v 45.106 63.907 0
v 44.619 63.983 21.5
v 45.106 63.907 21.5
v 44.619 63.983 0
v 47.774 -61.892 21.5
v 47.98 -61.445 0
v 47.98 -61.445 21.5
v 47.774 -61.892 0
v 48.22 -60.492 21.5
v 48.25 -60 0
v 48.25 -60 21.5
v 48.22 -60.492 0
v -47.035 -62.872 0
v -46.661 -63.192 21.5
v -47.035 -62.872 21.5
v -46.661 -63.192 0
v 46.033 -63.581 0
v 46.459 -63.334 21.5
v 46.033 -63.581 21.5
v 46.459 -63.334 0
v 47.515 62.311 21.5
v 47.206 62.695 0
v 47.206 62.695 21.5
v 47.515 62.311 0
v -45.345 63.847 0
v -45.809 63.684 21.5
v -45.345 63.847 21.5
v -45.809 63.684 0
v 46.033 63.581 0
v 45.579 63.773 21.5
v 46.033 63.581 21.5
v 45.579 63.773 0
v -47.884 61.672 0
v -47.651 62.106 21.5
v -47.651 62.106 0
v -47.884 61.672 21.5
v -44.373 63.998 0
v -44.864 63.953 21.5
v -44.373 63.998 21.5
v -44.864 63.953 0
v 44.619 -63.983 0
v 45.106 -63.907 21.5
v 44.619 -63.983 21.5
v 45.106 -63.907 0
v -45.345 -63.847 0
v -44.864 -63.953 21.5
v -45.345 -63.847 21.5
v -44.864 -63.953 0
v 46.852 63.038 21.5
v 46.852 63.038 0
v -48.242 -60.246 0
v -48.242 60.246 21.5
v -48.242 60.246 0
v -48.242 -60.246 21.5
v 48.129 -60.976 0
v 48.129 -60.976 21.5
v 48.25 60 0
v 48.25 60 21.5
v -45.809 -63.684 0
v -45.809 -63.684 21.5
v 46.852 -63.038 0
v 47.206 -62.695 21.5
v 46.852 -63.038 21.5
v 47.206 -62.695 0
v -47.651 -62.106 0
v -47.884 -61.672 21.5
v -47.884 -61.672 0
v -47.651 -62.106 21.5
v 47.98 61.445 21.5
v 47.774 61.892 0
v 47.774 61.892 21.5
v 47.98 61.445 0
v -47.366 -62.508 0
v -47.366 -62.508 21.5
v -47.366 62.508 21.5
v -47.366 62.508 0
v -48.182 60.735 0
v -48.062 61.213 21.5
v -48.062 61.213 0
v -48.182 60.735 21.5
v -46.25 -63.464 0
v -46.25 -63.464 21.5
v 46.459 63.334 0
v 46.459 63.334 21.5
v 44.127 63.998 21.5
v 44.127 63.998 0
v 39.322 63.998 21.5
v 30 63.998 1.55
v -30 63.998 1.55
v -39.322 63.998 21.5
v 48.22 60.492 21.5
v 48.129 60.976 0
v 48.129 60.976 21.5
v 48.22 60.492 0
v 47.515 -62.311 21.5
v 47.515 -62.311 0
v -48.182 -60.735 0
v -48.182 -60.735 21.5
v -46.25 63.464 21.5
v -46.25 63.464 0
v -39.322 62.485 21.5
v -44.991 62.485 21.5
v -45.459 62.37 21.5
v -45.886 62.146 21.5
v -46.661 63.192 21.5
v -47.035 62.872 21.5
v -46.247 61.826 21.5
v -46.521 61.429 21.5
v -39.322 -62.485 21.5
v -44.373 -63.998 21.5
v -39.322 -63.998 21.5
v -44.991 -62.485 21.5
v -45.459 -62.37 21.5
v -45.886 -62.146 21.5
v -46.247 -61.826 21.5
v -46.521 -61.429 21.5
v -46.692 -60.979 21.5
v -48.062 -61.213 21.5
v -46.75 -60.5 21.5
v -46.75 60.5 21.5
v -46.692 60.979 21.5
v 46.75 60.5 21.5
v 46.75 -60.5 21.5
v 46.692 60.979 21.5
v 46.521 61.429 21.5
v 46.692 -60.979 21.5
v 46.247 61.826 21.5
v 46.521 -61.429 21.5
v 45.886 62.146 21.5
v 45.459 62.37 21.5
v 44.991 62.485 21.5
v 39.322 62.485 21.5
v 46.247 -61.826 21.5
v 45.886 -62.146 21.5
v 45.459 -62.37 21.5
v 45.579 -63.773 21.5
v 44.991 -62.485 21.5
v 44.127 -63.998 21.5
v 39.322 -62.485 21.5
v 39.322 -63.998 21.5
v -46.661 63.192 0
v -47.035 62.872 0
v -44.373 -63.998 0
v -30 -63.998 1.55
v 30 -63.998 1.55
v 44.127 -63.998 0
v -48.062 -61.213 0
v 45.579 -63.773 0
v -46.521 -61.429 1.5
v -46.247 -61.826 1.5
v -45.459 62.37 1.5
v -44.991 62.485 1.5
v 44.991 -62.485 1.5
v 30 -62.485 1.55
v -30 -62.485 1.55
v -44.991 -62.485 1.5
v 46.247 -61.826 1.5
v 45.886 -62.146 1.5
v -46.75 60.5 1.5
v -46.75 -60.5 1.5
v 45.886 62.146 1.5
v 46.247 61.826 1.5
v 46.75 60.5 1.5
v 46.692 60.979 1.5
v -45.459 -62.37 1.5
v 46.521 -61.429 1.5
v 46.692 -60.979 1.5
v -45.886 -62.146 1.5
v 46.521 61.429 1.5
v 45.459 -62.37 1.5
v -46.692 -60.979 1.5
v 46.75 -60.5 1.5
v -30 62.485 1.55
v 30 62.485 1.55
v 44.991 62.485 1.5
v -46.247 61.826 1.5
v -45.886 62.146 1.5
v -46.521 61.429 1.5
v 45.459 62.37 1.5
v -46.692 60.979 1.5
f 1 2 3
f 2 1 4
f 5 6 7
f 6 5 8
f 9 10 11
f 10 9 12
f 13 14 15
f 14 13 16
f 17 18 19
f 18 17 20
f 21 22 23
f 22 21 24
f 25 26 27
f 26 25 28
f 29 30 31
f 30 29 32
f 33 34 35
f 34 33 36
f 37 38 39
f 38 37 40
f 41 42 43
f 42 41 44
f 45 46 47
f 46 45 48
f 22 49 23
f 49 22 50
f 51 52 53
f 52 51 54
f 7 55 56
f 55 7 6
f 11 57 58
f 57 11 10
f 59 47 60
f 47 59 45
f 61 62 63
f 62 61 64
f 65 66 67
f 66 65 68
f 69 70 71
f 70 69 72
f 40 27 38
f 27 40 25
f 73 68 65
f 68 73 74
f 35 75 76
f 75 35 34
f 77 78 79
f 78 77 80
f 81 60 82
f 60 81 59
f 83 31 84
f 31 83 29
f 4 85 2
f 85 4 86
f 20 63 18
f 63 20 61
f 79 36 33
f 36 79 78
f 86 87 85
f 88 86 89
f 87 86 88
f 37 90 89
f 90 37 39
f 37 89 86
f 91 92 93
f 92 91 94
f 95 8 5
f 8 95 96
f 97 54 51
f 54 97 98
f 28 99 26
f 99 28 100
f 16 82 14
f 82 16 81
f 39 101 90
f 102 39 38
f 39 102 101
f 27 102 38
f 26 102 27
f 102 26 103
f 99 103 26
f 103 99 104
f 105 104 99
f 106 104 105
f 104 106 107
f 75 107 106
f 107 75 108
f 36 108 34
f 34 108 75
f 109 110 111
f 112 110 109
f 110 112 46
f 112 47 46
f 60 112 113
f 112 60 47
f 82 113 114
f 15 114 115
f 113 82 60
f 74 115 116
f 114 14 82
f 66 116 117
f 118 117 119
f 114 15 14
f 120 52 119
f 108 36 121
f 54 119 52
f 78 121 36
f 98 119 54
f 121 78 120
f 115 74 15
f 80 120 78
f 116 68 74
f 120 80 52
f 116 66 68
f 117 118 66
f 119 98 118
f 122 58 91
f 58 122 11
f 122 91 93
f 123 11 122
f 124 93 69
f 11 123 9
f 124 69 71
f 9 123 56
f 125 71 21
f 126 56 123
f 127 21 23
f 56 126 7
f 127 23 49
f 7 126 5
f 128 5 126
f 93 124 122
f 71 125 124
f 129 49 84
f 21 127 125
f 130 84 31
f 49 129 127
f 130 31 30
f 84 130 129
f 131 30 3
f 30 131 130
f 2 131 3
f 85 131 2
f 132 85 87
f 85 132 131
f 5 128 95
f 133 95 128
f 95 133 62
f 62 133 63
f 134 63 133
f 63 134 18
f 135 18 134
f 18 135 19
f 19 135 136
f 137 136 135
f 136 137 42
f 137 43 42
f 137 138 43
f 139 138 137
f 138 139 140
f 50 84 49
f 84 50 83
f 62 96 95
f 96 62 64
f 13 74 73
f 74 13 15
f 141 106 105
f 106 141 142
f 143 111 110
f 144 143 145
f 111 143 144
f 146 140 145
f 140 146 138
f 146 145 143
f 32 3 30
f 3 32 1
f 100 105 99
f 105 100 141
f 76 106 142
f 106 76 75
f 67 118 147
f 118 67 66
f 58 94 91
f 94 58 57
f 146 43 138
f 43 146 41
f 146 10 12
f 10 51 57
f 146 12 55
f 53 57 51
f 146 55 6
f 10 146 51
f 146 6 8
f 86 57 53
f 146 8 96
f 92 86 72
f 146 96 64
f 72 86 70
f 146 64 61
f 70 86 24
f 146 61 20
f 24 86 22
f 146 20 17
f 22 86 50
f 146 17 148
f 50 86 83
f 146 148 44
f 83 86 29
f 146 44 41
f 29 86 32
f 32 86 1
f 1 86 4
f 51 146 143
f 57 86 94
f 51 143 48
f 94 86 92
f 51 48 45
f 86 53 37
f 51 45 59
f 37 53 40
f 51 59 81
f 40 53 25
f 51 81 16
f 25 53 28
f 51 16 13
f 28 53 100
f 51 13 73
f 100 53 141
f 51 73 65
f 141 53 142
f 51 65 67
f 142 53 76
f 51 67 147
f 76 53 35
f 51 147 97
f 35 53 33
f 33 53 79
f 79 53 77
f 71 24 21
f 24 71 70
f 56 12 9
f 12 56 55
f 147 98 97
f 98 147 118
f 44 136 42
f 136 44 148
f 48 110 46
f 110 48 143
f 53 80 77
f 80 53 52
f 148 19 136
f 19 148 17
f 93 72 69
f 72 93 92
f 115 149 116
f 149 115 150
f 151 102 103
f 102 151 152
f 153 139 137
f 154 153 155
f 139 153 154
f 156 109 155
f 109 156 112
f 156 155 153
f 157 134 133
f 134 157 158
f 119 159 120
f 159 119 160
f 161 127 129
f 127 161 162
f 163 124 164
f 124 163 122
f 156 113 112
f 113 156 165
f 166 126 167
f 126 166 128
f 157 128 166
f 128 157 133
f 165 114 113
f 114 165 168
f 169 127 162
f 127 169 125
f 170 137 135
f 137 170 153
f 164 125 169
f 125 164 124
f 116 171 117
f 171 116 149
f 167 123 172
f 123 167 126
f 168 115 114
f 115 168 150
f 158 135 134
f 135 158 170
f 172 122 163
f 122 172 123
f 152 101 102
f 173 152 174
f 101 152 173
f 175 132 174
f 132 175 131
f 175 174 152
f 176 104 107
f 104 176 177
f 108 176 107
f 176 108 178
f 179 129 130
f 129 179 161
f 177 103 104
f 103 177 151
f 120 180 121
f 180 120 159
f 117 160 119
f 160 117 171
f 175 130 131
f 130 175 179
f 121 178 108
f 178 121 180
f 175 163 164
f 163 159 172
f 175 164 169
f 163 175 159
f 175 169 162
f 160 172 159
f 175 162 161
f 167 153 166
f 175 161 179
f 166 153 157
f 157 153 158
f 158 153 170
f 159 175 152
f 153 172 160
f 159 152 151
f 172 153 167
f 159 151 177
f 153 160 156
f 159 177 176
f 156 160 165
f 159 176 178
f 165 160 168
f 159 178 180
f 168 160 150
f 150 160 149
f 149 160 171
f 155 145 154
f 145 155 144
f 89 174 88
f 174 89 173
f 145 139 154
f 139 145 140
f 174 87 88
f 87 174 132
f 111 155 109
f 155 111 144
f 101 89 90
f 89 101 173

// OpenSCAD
// file: config.scad
//$fs=$fs/2;
//$fa=$fa/2;

r4 = 2.2;
r8 = 4.2;
r10 = 5.2;

layer_height = 0.25;

switch_d = 9.6;

nema17_r_vis = 15.5;
nema17_r_centre = 11.5;
nema17_h_centre = 2;
nema17_h = 43;
nema17_l = 40;

boite_ui_largeur = 28.5;
boite_ui_l = 46;

support_laser = 24;

r3 = 1.75;
r3_2d = 1.5;
r3_vis = 1.65;
r3_head = 3.6;
m3_r = r3;
m3_nut_d = 7;
m3_nut_d2 = 6.2;
m3_nut_h = 3;

m4_r = 2.3;
m4_nut_d = 8.4;
m4_nut_d2 = 7.5;
m4_nut_h = 3.5;

608_r = 23/2;
608_h = 8;

laser_printer_l = 609;
laser_printer_lg = 456;


module support_nut(d=3, l_screw1 = 20, l_screw2 = 20, l_nut = 20, h_screw2 = 0.2){
    if(d==3){
        screw_r = r3;
        nut_r = m3_nut_d/2;
        nut_h = m3_nut_h;
        cylinder(nut_h, r = nut_r, $fn = 6, center = true);
        translate([0, 0, -l_screw1])cylinder(l_screw1 +1, r = screw_r, $fn = 8);
        translate([0, 0, m3_nut_h/2+ h_screw2])cylinder(l_screw2, r = screw_r, $fn = 8);
        l = m3_nut_d*cos(30);
        translate([0, -l/2, -nut_h/2]) cube([l_nut, l,nut_h]);
    } else if(d==4){
        screw_r = r4;
        nut_r = m4_nut_d/2;
        nut_h = m4_nut_h;
        cylinder(nut_h, r = nut_r, $fn = 6, center = true);
        translate([0, 0, -l_screw1])cylinder(l_screw1 +1, r = screw_r, $fn = 8);
        translate([0, 0, m4_nut_h/2+ h_screw2])cylinder(l_screw2, r = screw_r, $fn = 8);
        l = m4_nut_d*cos(30);
        translate([0, -l/2, -nut_h/2]) cube([l_nut, l,nut_h]);
    }
}


module nut(d=3, center = false){
    nut_r = m3_nut_d/2;
    nut_h = m3_nut_h;
    if(d==3){
        nut_r = m3_nut_d/2;
        nut_h = m3_nut_h;
    } 
    cylinder(nut_h, r = nut_r, $fn = 6, center = center);
}



module m3(h, nut = false, head = false){
    cylinder(h, m3_r, m3_r, $fn=16);
    if(nut){
        cylinder(m3_nut_h, r = m3_nut_d/2, $fn = 6);
    }
}

module m3_nut(h){
    cylinder(m3_nut_h, r = m3_nut_d/2, $fn = 6);
    translate([0, -m3_nut_d2/2, 0]) cube([h, m3_nut_d2, m3_nut_h]);
}

module m4(h, nut = false, head = false){
    cylinder(h, m4_r, m4_r);
    if(nut){
        cylinder(m4_nut_h, r = m4_nut_d/2, $fn = 6);
    }
}

module m5(h, nut = false, head = false){
    cylinder(h, r = 2.7);
}

m8_nut_d = 15;
m8_nut_d2 = 13;
m8_nut_h = 6.5;
module m8(h, nut = false, head = false){
    cylinder(h, r = r8);
    if(nut){
        cylinder(m8_nut_h, r = m8_nut_d/2, $fn = 6);
    }
}

module cube_arrondi(x, y, z, r=2){
    hull(){
        translate([(x/2-r), (y/2-r), 0]) cylinder(z,r=r);
        translate([(x/2-r), -(y/2-r), 0]) cylinder(z,r=r);
        translate([-(x/2-r), (y/2-r), 0]) cylinder(z,r=r);
        translate([-(x/2-r), -(y/2-r), 0]) cylinder(z,r=r);
    }
}

module demi_glissiere(r, l, h){
    cylinder(h, r, r);
    translate([-r, 0, 0]) cube([r*2, l, h]);
}


module nema17_2d(){
    nema17_l = 43;
    nema17_h = 6;
    polygon([[0,nema17_h], [nema17_h,0]
            , [nema17_l-nema17_h,0],[nema17_l,nema17_h]
            , [nema17_l,nema17_l-nema17_h],[nema17_l-nema17_h,nema17_l]
            , [8,nema17_l],[0,nema17_l-nema17_h] ]);
}

module nema17_2d2(){
    translate([nema17_r_vis, nema17_r_vis] ) circle(r3_2d);
    translate([nema17_r_vis, -nema17_r_vis] ) circle(r3_2d);
    translate([-nema17_r_vis, nema17_r_vis] ) circle(r3_2d);
    translate([-nema17_r_vis, -nema17_r_vis] ) circle(r3_2d);
    circle(nema17_r_centre);
}


module nema17(){
    translate([-nema17_h/2, -nema17_h/2, -nema17_l/2] ) linear_extrude(nema17_l) nema17_2d();
    
    h = nema17_h/2+6;
    translate([nema17_r_vis, nema17_r_vis, 0] )rotate([0, 0, 0]) cylinder(h, r = r3);
    translate([nema17_r_vis, -nema17_r_vis, 0] )rotate([0, 0, 0]) cylinder(h, r = r3);
    translate([-nema17_r_vis, nema17_r_vis, 0] )rotate([0, 0, 0]) cylinder(h, r = r3);
    translate([-nema17_r_vis, -nema17_r_vis, 0] )rotate([0, 0, 0]) cylinder(h, r = r3);
    cylinder(h, nema17_r_centre, nema17_r_centre);
    cylinder(h+14, r = 8);
    
    translate([-8.5, 0, -nema17_l/2] ) cube([17,30, 10]);
}

module corner(l_corner, h_corner, lg_corner){
    translate([0, lg_corner, 0]) rotate([90, 0, 0]) linear_extrude(lg_corner) polygon([[0,0], [l_corner, 0], [0, h_corner]]);
}


/**
 * 2D
 **/

module m3_2d(){
    circle(r3_2d);
}


module cran_x(_l, e, cran, inv){
    difference(){
        square([_l, e]);
        if(inv){
            for(i=[-round(_l/cran):round(_l/cran)]){
                translate([_l/2 + cran/2 - 2*i*cran, -1]) square([cran, e+2]);
            }
        }else{
            for(i=[-round(_l/cran):round(_l/cran)]){
                translate([_l/2 - cran/2 - 2*i*cran, -1]) square([cran, e+2]);
            }
        }
    }
}

module cran_y(_l, e, cran, inv){
    translate([e, 0]) rotate([0, 0, 90]) cran_x(_l, e, cran, inv); 
}

module whole_2d(type_vis){
    if(type_vis == 3){
        circle(1.5);
    } else if(type_vis == 4){
        circle(2);
    } else {
        echo("whole_2d " + type_vis);
    }
}

module nuts_2d(type_vis){
    if(type_vis == 3){
        translate([-1.5, 0])square([3, 20]);
        translate([-5.5/2, 10])square([5.5, 2.5]);
    } else if(type_vis == 4){
        translate([-2, 0])square([4, 30]);
        translate([-7/2, 20])square([7, 3.5]);
    } else {
        echo("nuts_2d " + type_vis);
    }
}

module cran_x_vis(_l, e, cran, type_vis = 3, trous = [0.1, 0.5, 0.9]){
    difference(){
        square([_l, e]);
        for(i=[-round(_l/cran):round(_l/cran)]){
                translate([_l/2 - cran/2 - 2*i*cran, -1]) square([cran, e+2]);
            }
        
    }
    for(i = trous){
        j = round((i-0.5)*_l/(2*cran));
        translate([_l/2  - 2*j*cran, e/2]) whole_2d(type_vis);
    }
}

module cran_x_nuts(_l, e, cran, type_vis = 3, trous = [0.1, 0.5, 0.9]){
    difference(){
        square([_l, e]);
        for(i=[-round(_l/cran):round(_l/cran)]){
                translate([_l/2 + cran/2 - 2*i*cran, -1]) square([cran, e+2]);
        }
    }
    for(i = trous){
        j = round((i-0.5)*_l/(2*cran));
        translate([_l/2  - 2*j*cran, e/2]) nuts_2d(type_vis);
    }
}

module cran_y_vis(_l, e, cran, type_vis = 3, trous = [0.1, 0.5, 0.9]){
    translate([e, 0]) rotate([0, 0, 90]) cran_x_vis(_l, e, cran, type_vis, trous);
}

module cran_y_nuts(_l, e, cran, type_vis = 3, trous = [0.1, 0.5, 0.9]){
    translate([0, _l]) rotate([0, 0, -90]) cran_x_nuts(_l, e, cran, type_vis, trous);
}
// main file
$fs=$fs/4;
$fa=$fa/4;
include <config.scad> 

card_l = 90;
card_lg = 60;
h=20;
e= 1.5;
e_h=1.5;

module support_2_card(){
    l = card_l+2*e;
    lg = 2*card_lg+3*e;
    difference(){
        cube_arrondi(l, lg, h+e_h, 4);
        
        for(i=[-1,1]){
            translate([0,i*(card_lg+e)/2,0]) union(){
                translate([0,0,e_h])cube_arrondi(card_l, card_lg,h+1);
                hull(){
                    translate([0,0,e_h+0.1])cube([card_l+h+e_h, card_lg-30,0.1], center = true);
                    translate([0,0,23])cube([card_l+h+e_h, card_lg-10,0.1], center = true);
                }
                for(j=[-1,1]){
                translate([j*card_l/2,0,-1])cube_arrondi(10,card_lg-30, 4);
                }    
            }
        }
    }
    
}


module support_2_up(){
    
    l = card_l+2*e+2*e+0.5;
    lg = 2*card_lg+3*e+2*e+0.5;
    difference(){
        cube_arrondi(l, lg, h+e_h, 4);
        
        translate([0,0,e_h]) cube_arrondi(l-2*e, lg-2*e, h+e_h, 2);
        hull(){
            translate([0,0,e_h+0.1])cube([card_l-30, lg+10,0.1], center = true);
            translate([0,0,23])cube([card_l-10, lg+10,0.1], center = true);
        }
    }
    
}

mode = 2;
if(mode == 0){
    translate([0,0,h+e_h+2])  rotate([0,180,0])support_2_up();
    support_2_card();
} else if(mode == 1){
    support_2_card();
} else {
    support_2_up();
}
